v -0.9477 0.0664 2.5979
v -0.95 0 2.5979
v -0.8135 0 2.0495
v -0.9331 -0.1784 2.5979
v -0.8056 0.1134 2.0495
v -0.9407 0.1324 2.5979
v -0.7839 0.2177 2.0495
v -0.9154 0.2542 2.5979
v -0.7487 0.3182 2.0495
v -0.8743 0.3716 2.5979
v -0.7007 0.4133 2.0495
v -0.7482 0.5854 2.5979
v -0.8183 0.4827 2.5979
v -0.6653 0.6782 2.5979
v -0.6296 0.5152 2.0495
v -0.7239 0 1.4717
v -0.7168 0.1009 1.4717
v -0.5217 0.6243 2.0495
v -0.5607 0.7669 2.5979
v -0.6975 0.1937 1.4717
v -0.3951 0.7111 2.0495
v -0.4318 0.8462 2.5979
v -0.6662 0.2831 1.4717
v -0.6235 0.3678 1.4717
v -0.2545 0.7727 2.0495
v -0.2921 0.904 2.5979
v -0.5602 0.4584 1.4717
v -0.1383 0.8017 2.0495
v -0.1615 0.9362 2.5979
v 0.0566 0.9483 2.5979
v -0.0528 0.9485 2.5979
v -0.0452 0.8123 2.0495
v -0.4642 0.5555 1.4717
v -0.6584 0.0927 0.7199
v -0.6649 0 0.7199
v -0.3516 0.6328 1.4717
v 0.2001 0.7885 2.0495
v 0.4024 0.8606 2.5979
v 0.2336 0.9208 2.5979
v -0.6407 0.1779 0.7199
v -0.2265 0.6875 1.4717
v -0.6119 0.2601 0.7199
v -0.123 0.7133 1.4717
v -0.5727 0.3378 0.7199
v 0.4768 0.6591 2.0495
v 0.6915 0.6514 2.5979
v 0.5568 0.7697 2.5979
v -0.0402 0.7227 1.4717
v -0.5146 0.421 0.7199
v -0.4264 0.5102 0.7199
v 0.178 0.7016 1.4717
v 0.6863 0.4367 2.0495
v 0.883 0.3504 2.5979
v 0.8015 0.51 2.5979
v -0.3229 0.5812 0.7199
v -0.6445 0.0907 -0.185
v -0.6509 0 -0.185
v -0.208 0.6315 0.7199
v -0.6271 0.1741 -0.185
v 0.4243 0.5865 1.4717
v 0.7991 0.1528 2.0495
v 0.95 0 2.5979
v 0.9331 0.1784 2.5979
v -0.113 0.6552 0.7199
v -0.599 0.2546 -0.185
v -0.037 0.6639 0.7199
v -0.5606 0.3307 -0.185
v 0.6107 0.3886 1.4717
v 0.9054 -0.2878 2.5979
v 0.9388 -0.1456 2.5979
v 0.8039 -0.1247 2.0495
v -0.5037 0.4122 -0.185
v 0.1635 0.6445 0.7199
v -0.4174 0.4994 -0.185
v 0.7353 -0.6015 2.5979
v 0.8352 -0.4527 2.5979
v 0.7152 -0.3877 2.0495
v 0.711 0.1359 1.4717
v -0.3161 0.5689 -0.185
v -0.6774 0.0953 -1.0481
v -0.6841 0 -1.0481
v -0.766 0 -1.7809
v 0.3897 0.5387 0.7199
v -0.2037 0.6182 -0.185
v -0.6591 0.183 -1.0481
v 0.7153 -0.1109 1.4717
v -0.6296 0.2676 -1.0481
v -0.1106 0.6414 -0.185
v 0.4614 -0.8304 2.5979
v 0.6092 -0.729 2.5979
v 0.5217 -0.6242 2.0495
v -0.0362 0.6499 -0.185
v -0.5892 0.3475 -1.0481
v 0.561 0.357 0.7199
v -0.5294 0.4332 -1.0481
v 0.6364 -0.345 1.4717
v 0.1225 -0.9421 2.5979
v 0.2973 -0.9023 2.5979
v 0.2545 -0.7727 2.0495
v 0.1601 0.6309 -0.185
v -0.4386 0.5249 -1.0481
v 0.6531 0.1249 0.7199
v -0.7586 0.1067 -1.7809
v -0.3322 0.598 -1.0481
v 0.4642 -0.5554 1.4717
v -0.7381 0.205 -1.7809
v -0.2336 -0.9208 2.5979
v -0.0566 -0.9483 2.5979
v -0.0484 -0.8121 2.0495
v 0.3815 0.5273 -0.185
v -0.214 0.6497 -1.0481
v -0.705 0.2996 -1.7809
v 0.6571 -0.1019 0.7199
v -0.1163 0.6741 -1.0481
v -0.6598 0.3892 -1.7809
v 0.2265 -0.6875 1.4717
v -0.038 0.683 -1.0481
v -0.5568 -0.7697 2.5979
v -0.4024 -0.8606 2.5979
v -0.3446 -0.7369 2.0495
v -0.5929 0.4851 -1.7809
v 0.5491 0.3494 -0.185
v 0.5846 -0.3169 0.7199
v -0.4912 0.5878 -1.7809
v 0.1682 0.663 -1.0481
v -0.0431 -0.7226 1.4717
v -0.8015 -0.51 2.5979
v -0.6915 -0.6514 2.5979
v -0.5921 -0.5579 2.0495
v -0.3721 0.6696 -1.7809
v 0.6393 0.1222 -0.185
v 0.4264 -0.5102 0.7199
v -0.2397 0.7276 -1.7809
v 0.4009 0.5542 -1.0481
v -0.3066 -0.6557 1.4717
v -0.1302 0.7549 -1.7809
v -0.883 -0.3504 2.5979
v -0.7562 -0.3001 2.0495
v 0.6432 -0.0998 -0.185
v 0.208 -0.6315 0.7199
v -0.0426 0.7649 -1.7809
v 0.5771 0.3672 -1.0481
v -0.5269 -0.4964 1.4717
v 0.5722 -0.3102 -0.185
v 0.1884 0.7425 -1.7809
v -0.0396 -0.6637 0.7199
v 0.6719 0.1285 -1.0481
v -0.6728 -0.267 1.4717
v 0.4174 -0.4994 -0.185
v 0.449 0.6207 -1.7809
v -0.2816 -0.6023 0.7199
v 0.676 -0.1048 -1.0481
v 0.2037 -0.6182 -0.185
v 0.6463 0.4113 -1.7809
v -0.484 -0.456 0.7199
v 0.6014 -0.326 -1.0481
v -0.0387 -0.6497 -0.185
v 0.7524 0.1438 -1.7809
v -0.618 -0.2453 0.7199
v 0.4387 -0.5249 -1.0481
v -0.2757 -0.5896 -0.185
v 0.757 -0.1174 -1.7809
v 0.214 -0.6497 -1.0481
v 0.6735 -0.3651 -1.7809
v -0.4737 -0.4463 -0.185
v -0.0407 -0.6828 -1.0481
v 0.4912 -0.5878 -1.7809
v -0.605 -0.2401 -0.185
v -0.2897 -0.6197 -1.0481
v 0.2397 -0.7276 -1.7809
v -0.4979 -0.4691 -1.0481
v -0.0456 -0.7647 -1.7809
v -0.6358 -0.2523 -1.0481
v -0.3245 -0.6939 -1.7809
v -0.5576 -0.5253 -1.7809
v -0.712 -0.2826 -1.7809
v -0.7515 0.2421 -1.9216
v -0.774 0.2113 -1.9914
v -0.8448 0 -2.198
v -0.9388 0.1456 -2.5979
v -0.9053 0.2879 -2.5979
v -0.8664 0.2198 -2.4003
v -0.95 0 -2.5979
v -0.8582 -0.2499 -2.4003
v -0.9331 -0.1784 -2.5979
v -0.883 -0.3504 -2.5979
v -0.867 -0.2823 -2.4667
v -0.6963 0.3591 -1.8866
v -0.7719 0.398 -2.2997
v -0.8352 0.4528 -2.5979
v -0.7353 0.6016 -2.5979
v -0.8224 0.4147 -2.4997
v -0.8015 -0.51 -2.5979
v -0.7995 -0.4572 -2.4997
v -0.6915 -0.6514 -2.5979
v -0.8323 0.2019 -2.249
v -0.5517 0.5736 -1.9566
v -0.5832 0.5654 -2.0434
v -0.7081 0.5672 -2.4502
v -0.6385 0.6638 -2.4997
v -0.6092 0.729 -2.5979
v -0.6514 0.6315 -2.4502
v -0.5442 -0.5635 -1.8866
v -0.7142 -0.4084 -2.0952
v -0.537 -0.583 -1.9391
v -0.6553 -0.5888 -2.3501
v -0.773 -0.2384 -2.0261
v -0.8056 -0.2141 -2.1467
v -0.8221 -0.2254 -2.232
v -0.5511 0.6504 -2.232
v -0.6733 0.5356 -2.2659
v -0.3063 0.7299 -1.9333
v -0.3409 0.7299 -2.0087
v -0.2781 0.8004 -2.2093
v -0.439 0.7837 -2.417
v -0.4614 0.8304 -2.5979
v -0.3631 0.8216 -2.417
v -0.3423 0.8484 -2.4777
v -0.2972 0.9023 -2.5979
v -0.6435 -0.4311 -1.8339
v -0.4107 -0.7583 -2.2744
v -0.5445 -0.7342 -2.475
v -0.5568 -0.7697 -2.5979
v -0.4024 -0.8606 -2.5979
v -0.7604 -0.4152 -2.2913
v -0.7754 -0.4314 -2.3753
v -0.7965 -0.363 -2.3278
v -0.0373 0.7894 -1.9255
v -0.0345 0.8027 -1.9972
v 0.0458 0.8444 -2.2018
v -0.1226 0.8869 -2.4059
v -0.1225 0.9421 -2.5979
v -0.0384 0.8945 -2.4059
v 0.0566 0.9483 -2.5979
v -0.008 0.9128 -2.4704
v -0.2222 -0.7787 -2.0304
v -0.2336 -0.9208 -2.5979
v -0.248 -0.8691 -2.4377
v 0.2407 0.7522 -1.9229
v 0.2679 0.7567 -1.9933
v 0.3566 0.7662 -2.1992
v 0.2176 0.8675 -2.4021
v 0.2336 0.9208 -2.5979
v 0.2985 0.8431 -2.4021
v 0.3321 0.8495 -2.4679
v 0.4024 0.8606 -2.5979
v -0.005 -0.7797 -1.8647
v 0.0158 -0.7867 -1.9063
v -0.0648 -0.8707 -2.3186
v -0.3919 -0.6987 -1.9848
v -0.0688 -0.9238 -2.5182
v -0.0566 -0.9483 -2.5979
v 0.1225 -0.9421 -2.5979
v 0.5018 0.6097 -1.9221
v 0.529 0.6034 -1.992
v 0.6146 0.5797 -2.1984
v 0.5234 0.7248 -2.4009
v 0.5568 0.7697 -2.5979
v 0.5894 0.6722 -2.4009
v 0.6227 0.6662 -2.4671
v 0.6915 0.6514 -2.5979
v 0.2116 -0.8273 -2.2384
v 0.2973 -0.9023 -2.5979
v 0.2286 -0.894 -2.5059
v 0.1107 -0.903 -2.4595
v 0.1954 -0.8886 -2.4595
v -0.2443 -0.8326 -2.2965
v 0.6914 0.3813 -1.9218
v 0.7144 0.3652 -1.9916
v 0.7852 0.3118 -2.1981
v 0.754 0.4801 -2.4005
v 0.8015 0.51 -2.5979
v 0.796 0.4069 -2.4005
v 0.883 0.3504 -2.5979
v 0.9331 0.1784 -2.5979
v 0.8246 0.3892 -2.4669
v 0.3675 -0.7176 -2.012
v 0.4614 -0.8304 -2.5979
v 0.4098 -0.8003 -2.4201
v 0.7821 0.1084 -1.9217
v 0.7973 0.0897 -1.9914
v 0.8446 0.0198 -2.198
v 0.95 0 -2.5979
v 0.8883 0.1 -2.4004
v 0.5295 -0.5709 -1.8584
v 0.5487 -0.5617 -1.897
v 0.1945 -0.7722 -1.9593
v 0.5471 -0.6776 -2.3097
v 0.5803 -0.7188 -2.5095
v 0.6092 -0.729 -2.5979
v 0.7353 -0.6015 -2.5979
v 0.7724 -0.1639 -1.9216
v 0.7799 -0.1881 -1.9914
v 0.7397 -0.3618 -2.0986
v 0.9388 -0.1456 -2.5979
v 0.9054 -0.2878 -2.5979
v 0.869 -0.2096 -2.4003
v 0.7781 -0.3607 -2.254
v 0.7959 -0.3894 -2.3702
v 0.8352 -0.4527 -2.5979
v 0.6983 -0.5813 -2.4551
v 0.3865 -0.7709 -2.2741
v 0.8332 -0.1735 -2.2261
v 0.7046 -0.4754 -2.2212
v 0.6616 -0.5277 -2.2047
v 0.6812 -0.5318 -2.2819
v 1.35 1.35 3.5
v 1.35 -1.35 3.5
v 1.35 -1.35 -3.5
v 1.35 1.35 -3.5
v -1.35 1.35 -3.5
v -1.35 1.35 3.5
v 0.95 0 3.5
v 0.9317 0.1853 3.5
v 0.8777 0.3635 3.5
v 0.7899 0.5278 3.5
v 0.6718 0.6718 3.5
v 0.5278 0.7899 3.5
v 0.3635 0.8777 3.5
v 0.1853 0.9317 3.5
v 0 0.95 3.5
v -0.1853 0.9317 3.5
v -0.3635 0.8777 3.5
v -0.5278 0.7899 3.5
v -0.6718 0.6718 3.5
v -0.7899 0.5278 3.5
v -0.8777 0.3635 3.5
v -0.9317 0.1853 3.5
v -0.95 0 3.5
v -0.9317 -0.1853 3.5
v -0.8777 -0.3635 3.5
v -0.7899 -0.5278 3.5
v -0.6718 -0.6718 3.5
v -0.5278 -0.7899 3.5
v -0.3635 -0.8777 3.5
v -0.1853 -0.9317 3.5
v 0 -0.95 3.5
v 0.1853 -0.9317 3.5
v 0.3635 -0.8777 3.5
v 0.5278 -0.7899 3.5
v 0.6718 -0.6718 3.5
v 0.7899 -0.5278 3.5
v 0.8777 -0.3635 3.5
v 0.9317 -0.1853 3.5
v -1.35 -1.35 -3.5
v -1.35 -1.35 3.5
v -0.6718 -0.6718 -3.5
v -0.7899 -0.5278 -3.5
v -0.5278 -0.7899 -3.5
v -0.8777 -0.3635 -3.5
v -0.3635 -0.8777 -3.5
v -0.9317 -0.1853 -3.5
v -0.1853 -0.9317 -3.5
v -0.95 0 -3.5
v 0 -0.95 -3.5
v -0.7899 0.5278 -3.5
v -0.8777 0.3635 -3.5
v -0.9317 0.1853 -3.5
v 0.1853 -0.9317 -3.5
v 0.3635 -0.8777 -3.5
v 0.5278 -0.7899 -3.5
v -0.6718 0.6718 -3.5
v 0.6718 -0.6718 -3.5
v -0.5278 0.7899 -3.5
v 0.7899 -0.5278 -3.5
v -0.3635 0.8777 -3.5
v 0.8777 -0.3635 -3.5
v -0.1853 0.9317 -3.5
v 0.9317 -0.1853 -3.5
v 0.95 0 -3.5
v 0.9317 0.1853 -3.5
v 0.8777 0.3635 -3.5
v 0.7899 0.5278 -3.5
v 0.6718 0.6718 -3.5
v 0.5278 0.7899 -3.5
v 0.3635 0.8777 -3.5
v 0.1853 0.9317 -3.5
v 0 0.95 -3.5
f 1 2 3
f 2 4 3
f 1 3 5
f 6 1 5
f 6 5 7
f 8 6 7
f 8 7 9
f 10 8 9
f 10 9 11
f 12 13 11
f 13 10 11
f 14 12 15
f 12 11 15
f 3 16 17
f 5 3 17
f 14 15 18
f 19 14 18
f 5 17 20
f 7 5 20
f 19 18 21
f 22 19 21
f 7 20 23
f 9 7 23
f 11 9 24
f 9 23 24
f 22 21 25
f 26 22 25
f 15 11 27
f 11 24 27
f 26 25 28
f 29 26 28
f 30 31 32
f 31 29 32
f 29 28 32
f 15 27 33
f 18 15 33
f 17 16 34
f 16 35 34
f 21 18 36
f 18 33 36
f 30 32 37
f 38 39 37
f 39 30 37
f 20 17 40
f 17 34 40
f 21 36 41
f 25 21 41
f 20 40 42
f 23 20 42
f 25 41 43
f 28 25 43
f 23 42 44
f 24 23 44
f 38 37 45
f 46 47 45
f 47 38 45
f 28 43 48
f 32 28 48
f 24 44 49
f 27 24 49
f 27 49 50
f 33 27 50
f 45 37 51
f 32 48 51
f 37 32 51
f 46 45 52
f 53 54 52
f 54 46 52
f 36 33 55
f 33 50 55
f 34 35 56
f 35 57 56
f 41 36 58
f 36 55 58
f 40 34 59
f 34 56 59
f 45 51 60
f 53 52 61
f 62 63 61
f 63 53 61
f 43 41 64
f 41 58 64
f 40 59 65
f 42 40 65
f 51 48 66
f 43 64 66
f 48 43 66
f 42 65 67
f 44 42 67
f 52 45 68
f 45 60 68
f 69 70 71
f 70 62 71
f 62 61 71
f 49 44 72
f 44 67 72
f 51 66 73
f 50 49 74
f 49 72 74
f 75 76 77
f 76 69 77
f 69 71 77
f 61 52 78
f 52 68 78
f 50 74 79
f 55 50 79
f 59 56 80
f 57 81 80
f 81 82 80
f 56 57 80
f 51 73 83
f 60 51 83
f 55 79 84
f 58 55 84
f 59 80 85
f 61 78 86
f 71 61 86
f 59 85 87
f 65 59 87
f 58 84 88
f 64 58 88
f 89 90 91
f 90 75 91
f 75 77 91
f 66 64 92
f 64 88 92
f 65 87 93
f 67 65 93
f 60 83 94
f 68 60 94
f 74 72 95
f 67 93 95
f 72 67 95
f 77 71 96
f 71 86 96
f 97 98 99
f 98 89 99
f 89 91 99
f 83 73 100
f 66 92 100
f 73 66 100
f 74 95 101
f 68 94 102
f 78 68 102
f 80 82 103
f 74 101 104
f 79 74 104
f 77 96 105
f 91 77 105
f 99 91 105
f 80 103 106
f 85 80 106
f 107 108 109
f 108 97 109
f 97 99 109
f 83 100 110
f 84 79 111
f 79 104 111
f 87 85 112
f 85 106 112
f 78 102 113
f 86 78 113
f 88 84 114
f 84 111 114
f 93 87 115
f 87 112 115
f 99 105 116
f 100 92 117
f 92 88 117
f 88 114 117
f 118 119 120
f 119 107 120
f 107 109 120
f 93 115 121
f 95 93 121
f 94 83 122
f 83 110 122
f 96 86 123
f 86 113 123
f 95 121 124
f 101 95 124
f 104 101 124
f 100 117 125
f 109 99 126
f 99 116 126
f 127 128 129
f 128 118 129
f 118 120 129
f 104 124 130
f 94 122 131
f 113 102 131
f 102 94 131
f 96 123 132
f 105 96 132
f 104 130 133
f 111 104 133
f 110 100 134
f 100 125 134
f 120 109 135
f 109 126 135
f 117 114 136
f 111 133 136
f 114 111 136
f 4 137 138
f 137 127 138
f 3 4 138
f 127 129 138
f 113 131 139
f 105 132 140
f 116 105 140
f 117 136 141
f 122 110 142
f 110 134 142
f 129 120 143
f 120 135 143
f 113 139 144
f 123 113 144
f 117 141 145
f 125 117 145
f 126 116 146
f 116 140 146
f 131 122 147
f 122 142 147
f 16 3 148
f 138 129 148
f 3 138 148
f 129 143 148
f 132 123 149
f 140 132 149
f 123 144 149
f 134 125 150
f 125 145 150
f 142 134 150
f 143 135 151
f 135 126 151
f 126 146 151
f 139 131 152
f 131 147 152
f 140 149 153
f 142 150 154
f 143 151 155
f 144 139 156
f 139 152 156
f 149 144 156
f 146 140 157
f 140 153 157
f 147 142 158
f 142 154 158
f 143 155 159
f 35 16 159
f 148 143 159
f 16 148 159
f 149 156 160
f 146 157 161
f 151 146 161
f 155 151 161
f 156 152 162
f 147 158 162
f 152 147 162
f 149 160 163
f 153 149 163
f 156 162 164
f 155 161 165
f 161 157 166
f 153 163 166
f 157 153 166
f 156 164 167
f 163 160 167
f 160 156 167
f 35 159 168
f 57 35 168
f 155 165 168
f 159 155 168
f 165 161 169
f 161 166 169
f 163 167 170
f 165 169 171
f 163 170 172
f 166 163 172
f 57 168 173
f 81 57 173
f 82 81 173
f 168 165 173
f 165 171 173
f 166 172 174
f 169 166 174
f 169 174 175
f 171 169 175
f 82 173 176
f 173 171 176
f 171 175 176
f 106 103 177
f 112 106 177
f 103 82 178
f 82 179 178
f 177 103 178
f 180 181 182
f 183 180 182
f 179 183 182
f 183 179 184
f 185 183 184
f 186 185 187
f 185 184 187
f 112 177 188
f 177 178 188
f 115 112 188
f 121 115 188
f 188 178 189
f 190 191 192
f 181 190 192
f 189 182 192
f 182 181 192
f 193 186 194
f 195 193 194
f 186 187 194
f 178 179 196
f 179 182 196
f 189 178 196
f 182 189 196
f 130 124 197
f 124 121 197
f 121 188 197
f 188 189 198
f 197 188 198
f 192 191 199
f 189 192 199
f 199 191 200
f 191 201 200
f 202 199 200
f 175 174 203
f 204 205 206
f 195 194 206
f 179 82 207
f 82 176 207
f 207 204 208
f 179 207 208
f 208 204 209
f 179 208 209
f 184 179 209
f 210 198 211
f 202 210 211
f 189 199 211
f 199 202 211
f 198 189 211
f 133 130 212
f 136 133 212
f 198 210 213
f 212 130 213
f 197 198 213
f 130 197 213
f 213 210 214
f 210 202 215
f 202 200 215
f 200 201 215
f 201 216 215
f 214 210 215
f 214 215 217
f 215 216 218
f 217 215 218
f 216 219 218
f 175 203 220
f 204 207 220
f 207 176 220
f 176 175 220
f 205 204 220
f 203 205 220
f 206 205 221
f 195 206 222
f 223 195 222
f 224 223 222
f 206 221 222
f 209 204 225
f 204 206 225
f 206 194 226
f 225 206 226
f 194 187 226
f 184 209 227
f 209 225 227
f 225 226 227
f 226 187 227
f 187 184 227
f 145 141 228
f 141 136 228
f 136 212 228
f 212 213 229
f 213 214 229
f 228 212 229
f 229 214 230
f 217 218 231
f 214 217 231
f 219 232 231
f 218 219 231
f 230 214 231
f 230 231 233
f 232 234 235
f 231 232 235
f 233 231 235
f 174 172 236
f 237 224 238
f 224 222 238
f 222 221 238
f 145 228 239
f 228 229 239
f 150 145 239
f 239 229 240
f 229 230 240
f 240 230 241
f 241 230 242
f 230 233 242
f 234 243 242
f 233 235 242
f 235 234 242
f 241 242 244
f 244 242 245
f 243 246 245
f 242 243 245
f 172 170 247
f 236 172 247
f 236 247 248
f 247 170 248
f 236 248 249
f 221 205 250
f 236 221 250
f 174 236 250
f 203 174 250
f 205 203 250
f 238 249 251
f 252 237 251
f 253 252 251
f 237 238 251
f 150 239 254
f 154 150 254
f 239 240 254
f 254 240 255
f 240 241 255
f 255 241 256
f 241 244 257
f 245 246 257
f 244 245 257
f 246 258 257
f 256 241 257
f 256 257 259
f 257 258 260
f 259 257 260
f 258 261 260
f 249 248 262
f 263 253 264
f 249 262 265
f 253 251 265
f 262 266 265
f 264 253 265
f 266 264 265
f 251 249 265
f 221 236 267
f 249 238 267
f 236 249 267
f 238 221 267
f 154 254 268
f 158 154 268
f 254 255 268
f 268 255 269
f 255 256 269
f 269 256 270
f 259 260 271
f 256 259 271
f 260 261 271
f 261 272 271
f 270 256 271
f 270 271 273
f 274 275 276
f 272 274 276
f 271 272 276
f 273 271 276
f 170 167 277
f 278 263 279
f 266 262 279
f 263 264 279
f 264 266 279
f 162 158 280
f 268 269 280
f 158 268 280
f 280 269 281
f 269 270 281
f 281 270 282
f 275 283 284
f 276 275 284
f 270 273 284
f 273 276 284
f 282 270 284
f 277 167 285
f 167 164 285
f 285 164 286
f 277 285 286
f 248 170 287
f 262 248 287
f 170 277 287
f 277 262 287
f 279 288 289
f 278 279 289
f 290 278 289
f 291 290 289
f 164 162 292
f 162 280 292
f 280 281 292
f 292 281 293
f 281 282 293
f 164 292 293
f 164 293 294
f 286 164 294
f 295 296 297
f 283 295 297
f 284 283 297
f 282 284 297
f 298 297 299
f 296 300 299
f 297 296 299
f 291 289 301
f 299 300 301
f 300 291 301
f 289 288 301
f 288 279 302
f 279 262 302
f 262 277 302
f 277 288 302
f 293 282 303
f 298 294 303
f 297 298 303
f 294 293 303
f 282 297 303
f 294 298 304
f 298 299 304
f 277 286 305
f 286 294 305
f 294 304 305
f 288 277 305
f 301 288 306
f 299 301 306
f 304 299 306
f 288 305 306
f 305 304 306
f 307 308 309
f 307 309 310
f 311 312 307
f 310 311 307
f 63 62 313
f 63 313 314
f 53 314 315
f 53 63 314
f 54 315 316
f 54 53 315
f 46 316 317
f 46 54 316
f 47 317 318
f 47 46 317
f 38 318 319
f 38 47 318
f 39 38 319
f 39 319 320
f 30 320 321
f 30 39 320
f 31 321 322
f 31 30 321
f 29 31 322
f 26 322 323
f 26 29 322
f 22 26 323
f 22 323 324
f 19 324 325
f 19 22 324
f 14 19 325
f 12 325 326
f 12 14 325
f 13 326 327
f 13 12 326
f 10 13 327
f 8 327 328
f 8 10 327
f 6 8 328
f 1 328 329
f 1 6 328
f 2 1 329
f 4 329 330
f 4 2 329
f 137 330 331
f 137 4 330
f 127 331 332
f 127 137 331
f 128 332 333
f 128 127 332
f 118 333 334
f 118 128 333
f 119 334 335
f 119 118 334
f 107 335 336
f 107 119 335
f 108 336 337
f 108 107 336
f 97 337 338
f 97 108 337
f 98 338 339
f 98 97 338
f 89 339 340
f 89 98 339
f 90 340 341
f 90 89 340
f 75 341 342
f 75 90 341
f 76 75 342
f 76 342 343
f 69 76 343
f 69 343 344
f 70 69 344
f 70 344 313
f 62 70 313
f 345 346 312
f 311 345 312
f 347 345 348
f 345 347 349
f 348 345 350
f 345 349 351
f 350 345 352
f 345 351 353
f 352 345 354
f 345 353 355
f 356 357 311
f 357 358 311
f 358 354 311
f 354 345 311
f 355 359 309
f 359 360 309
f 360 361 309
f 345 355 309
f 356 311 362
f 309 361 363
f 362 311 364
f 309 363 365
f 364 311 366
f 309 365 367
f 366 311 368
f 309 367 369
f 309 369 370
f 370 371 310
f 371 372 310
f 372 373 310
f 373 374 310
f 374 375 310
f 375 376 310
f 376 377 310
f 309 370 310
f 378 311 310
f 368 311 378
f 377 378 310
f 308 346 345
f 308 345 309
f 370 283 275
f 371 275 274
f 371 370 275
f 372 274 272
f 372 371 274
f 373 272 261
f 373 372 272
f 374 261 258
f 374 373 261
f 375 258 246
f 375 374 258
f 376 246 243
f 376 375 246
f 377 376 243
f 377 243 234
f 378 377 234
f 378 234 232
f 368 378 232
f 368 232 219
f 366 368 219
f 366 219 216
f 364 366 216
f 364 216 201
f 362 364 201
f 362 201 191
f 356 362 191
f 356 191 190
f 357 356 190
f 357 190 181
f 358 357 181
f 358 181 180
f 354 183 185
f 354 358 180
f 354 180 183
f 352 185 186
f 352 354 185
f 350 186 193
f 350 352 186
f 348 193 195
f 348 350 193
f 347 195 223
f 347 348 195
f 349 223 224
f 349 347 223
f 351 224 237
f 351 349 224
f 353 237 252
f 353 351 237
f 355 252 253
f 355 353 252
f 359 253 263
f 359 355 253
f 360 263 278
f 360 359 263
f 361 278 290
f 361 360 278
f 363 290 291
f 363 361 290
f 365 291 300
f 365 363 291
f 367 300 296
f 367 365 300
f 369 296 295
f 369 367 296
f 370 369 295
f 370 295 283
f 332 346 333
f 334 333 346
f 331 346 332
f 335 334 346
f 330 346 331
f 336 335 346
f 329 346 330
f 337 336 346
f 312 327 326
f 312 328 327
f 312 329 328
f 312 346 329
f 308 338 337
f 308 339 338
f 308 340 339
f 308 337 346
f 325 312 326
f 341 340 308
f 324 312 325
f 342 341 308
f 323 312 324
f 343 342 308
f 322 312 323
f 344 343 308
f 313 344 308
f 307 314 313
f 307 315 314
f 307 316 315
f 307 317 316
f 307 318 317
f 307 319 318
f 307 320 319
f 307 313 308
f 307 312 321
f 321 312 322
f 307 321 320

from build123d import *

# Parameters (mm, degrees)
F2_W     = 2.7
F2_H     = 2.7
F2_R     = 0.95
F3_DEPTH = 3.5


with BuildPart() as f1:
    # F0 (on Front) → F1 (revolve)
    with BuildSketch(Plane.XZ):
        with BuildLine():
            add(Edge.make_bspline(
                [(-1.35, 3.5), (-0.77, 2.566667), (-0.53, 0), (-0.77, -2.566667), (-1.35, -3.5)],
                knots=[0, 0, 0, 0, 3.569314, 7.138627, 7.138627, 7.138627, 7.138627], degree=3))
            Line((-1.35, 3.5), (-1.35, -3.5))
        make_face()
    revolve(axis=Axis((0, 0, 0), (0, 0, -1)))

    # F2 (on Top) → F3 (join, symmetric)
    with BuildSketch(Plane.XY):
        Rectangle(F2_W, F2_H)
        Circle(F2_R, mode=Mode.SUBTRACT)
    extrude(amount=F3_DEPTH, both=True)


solid = f1.part
